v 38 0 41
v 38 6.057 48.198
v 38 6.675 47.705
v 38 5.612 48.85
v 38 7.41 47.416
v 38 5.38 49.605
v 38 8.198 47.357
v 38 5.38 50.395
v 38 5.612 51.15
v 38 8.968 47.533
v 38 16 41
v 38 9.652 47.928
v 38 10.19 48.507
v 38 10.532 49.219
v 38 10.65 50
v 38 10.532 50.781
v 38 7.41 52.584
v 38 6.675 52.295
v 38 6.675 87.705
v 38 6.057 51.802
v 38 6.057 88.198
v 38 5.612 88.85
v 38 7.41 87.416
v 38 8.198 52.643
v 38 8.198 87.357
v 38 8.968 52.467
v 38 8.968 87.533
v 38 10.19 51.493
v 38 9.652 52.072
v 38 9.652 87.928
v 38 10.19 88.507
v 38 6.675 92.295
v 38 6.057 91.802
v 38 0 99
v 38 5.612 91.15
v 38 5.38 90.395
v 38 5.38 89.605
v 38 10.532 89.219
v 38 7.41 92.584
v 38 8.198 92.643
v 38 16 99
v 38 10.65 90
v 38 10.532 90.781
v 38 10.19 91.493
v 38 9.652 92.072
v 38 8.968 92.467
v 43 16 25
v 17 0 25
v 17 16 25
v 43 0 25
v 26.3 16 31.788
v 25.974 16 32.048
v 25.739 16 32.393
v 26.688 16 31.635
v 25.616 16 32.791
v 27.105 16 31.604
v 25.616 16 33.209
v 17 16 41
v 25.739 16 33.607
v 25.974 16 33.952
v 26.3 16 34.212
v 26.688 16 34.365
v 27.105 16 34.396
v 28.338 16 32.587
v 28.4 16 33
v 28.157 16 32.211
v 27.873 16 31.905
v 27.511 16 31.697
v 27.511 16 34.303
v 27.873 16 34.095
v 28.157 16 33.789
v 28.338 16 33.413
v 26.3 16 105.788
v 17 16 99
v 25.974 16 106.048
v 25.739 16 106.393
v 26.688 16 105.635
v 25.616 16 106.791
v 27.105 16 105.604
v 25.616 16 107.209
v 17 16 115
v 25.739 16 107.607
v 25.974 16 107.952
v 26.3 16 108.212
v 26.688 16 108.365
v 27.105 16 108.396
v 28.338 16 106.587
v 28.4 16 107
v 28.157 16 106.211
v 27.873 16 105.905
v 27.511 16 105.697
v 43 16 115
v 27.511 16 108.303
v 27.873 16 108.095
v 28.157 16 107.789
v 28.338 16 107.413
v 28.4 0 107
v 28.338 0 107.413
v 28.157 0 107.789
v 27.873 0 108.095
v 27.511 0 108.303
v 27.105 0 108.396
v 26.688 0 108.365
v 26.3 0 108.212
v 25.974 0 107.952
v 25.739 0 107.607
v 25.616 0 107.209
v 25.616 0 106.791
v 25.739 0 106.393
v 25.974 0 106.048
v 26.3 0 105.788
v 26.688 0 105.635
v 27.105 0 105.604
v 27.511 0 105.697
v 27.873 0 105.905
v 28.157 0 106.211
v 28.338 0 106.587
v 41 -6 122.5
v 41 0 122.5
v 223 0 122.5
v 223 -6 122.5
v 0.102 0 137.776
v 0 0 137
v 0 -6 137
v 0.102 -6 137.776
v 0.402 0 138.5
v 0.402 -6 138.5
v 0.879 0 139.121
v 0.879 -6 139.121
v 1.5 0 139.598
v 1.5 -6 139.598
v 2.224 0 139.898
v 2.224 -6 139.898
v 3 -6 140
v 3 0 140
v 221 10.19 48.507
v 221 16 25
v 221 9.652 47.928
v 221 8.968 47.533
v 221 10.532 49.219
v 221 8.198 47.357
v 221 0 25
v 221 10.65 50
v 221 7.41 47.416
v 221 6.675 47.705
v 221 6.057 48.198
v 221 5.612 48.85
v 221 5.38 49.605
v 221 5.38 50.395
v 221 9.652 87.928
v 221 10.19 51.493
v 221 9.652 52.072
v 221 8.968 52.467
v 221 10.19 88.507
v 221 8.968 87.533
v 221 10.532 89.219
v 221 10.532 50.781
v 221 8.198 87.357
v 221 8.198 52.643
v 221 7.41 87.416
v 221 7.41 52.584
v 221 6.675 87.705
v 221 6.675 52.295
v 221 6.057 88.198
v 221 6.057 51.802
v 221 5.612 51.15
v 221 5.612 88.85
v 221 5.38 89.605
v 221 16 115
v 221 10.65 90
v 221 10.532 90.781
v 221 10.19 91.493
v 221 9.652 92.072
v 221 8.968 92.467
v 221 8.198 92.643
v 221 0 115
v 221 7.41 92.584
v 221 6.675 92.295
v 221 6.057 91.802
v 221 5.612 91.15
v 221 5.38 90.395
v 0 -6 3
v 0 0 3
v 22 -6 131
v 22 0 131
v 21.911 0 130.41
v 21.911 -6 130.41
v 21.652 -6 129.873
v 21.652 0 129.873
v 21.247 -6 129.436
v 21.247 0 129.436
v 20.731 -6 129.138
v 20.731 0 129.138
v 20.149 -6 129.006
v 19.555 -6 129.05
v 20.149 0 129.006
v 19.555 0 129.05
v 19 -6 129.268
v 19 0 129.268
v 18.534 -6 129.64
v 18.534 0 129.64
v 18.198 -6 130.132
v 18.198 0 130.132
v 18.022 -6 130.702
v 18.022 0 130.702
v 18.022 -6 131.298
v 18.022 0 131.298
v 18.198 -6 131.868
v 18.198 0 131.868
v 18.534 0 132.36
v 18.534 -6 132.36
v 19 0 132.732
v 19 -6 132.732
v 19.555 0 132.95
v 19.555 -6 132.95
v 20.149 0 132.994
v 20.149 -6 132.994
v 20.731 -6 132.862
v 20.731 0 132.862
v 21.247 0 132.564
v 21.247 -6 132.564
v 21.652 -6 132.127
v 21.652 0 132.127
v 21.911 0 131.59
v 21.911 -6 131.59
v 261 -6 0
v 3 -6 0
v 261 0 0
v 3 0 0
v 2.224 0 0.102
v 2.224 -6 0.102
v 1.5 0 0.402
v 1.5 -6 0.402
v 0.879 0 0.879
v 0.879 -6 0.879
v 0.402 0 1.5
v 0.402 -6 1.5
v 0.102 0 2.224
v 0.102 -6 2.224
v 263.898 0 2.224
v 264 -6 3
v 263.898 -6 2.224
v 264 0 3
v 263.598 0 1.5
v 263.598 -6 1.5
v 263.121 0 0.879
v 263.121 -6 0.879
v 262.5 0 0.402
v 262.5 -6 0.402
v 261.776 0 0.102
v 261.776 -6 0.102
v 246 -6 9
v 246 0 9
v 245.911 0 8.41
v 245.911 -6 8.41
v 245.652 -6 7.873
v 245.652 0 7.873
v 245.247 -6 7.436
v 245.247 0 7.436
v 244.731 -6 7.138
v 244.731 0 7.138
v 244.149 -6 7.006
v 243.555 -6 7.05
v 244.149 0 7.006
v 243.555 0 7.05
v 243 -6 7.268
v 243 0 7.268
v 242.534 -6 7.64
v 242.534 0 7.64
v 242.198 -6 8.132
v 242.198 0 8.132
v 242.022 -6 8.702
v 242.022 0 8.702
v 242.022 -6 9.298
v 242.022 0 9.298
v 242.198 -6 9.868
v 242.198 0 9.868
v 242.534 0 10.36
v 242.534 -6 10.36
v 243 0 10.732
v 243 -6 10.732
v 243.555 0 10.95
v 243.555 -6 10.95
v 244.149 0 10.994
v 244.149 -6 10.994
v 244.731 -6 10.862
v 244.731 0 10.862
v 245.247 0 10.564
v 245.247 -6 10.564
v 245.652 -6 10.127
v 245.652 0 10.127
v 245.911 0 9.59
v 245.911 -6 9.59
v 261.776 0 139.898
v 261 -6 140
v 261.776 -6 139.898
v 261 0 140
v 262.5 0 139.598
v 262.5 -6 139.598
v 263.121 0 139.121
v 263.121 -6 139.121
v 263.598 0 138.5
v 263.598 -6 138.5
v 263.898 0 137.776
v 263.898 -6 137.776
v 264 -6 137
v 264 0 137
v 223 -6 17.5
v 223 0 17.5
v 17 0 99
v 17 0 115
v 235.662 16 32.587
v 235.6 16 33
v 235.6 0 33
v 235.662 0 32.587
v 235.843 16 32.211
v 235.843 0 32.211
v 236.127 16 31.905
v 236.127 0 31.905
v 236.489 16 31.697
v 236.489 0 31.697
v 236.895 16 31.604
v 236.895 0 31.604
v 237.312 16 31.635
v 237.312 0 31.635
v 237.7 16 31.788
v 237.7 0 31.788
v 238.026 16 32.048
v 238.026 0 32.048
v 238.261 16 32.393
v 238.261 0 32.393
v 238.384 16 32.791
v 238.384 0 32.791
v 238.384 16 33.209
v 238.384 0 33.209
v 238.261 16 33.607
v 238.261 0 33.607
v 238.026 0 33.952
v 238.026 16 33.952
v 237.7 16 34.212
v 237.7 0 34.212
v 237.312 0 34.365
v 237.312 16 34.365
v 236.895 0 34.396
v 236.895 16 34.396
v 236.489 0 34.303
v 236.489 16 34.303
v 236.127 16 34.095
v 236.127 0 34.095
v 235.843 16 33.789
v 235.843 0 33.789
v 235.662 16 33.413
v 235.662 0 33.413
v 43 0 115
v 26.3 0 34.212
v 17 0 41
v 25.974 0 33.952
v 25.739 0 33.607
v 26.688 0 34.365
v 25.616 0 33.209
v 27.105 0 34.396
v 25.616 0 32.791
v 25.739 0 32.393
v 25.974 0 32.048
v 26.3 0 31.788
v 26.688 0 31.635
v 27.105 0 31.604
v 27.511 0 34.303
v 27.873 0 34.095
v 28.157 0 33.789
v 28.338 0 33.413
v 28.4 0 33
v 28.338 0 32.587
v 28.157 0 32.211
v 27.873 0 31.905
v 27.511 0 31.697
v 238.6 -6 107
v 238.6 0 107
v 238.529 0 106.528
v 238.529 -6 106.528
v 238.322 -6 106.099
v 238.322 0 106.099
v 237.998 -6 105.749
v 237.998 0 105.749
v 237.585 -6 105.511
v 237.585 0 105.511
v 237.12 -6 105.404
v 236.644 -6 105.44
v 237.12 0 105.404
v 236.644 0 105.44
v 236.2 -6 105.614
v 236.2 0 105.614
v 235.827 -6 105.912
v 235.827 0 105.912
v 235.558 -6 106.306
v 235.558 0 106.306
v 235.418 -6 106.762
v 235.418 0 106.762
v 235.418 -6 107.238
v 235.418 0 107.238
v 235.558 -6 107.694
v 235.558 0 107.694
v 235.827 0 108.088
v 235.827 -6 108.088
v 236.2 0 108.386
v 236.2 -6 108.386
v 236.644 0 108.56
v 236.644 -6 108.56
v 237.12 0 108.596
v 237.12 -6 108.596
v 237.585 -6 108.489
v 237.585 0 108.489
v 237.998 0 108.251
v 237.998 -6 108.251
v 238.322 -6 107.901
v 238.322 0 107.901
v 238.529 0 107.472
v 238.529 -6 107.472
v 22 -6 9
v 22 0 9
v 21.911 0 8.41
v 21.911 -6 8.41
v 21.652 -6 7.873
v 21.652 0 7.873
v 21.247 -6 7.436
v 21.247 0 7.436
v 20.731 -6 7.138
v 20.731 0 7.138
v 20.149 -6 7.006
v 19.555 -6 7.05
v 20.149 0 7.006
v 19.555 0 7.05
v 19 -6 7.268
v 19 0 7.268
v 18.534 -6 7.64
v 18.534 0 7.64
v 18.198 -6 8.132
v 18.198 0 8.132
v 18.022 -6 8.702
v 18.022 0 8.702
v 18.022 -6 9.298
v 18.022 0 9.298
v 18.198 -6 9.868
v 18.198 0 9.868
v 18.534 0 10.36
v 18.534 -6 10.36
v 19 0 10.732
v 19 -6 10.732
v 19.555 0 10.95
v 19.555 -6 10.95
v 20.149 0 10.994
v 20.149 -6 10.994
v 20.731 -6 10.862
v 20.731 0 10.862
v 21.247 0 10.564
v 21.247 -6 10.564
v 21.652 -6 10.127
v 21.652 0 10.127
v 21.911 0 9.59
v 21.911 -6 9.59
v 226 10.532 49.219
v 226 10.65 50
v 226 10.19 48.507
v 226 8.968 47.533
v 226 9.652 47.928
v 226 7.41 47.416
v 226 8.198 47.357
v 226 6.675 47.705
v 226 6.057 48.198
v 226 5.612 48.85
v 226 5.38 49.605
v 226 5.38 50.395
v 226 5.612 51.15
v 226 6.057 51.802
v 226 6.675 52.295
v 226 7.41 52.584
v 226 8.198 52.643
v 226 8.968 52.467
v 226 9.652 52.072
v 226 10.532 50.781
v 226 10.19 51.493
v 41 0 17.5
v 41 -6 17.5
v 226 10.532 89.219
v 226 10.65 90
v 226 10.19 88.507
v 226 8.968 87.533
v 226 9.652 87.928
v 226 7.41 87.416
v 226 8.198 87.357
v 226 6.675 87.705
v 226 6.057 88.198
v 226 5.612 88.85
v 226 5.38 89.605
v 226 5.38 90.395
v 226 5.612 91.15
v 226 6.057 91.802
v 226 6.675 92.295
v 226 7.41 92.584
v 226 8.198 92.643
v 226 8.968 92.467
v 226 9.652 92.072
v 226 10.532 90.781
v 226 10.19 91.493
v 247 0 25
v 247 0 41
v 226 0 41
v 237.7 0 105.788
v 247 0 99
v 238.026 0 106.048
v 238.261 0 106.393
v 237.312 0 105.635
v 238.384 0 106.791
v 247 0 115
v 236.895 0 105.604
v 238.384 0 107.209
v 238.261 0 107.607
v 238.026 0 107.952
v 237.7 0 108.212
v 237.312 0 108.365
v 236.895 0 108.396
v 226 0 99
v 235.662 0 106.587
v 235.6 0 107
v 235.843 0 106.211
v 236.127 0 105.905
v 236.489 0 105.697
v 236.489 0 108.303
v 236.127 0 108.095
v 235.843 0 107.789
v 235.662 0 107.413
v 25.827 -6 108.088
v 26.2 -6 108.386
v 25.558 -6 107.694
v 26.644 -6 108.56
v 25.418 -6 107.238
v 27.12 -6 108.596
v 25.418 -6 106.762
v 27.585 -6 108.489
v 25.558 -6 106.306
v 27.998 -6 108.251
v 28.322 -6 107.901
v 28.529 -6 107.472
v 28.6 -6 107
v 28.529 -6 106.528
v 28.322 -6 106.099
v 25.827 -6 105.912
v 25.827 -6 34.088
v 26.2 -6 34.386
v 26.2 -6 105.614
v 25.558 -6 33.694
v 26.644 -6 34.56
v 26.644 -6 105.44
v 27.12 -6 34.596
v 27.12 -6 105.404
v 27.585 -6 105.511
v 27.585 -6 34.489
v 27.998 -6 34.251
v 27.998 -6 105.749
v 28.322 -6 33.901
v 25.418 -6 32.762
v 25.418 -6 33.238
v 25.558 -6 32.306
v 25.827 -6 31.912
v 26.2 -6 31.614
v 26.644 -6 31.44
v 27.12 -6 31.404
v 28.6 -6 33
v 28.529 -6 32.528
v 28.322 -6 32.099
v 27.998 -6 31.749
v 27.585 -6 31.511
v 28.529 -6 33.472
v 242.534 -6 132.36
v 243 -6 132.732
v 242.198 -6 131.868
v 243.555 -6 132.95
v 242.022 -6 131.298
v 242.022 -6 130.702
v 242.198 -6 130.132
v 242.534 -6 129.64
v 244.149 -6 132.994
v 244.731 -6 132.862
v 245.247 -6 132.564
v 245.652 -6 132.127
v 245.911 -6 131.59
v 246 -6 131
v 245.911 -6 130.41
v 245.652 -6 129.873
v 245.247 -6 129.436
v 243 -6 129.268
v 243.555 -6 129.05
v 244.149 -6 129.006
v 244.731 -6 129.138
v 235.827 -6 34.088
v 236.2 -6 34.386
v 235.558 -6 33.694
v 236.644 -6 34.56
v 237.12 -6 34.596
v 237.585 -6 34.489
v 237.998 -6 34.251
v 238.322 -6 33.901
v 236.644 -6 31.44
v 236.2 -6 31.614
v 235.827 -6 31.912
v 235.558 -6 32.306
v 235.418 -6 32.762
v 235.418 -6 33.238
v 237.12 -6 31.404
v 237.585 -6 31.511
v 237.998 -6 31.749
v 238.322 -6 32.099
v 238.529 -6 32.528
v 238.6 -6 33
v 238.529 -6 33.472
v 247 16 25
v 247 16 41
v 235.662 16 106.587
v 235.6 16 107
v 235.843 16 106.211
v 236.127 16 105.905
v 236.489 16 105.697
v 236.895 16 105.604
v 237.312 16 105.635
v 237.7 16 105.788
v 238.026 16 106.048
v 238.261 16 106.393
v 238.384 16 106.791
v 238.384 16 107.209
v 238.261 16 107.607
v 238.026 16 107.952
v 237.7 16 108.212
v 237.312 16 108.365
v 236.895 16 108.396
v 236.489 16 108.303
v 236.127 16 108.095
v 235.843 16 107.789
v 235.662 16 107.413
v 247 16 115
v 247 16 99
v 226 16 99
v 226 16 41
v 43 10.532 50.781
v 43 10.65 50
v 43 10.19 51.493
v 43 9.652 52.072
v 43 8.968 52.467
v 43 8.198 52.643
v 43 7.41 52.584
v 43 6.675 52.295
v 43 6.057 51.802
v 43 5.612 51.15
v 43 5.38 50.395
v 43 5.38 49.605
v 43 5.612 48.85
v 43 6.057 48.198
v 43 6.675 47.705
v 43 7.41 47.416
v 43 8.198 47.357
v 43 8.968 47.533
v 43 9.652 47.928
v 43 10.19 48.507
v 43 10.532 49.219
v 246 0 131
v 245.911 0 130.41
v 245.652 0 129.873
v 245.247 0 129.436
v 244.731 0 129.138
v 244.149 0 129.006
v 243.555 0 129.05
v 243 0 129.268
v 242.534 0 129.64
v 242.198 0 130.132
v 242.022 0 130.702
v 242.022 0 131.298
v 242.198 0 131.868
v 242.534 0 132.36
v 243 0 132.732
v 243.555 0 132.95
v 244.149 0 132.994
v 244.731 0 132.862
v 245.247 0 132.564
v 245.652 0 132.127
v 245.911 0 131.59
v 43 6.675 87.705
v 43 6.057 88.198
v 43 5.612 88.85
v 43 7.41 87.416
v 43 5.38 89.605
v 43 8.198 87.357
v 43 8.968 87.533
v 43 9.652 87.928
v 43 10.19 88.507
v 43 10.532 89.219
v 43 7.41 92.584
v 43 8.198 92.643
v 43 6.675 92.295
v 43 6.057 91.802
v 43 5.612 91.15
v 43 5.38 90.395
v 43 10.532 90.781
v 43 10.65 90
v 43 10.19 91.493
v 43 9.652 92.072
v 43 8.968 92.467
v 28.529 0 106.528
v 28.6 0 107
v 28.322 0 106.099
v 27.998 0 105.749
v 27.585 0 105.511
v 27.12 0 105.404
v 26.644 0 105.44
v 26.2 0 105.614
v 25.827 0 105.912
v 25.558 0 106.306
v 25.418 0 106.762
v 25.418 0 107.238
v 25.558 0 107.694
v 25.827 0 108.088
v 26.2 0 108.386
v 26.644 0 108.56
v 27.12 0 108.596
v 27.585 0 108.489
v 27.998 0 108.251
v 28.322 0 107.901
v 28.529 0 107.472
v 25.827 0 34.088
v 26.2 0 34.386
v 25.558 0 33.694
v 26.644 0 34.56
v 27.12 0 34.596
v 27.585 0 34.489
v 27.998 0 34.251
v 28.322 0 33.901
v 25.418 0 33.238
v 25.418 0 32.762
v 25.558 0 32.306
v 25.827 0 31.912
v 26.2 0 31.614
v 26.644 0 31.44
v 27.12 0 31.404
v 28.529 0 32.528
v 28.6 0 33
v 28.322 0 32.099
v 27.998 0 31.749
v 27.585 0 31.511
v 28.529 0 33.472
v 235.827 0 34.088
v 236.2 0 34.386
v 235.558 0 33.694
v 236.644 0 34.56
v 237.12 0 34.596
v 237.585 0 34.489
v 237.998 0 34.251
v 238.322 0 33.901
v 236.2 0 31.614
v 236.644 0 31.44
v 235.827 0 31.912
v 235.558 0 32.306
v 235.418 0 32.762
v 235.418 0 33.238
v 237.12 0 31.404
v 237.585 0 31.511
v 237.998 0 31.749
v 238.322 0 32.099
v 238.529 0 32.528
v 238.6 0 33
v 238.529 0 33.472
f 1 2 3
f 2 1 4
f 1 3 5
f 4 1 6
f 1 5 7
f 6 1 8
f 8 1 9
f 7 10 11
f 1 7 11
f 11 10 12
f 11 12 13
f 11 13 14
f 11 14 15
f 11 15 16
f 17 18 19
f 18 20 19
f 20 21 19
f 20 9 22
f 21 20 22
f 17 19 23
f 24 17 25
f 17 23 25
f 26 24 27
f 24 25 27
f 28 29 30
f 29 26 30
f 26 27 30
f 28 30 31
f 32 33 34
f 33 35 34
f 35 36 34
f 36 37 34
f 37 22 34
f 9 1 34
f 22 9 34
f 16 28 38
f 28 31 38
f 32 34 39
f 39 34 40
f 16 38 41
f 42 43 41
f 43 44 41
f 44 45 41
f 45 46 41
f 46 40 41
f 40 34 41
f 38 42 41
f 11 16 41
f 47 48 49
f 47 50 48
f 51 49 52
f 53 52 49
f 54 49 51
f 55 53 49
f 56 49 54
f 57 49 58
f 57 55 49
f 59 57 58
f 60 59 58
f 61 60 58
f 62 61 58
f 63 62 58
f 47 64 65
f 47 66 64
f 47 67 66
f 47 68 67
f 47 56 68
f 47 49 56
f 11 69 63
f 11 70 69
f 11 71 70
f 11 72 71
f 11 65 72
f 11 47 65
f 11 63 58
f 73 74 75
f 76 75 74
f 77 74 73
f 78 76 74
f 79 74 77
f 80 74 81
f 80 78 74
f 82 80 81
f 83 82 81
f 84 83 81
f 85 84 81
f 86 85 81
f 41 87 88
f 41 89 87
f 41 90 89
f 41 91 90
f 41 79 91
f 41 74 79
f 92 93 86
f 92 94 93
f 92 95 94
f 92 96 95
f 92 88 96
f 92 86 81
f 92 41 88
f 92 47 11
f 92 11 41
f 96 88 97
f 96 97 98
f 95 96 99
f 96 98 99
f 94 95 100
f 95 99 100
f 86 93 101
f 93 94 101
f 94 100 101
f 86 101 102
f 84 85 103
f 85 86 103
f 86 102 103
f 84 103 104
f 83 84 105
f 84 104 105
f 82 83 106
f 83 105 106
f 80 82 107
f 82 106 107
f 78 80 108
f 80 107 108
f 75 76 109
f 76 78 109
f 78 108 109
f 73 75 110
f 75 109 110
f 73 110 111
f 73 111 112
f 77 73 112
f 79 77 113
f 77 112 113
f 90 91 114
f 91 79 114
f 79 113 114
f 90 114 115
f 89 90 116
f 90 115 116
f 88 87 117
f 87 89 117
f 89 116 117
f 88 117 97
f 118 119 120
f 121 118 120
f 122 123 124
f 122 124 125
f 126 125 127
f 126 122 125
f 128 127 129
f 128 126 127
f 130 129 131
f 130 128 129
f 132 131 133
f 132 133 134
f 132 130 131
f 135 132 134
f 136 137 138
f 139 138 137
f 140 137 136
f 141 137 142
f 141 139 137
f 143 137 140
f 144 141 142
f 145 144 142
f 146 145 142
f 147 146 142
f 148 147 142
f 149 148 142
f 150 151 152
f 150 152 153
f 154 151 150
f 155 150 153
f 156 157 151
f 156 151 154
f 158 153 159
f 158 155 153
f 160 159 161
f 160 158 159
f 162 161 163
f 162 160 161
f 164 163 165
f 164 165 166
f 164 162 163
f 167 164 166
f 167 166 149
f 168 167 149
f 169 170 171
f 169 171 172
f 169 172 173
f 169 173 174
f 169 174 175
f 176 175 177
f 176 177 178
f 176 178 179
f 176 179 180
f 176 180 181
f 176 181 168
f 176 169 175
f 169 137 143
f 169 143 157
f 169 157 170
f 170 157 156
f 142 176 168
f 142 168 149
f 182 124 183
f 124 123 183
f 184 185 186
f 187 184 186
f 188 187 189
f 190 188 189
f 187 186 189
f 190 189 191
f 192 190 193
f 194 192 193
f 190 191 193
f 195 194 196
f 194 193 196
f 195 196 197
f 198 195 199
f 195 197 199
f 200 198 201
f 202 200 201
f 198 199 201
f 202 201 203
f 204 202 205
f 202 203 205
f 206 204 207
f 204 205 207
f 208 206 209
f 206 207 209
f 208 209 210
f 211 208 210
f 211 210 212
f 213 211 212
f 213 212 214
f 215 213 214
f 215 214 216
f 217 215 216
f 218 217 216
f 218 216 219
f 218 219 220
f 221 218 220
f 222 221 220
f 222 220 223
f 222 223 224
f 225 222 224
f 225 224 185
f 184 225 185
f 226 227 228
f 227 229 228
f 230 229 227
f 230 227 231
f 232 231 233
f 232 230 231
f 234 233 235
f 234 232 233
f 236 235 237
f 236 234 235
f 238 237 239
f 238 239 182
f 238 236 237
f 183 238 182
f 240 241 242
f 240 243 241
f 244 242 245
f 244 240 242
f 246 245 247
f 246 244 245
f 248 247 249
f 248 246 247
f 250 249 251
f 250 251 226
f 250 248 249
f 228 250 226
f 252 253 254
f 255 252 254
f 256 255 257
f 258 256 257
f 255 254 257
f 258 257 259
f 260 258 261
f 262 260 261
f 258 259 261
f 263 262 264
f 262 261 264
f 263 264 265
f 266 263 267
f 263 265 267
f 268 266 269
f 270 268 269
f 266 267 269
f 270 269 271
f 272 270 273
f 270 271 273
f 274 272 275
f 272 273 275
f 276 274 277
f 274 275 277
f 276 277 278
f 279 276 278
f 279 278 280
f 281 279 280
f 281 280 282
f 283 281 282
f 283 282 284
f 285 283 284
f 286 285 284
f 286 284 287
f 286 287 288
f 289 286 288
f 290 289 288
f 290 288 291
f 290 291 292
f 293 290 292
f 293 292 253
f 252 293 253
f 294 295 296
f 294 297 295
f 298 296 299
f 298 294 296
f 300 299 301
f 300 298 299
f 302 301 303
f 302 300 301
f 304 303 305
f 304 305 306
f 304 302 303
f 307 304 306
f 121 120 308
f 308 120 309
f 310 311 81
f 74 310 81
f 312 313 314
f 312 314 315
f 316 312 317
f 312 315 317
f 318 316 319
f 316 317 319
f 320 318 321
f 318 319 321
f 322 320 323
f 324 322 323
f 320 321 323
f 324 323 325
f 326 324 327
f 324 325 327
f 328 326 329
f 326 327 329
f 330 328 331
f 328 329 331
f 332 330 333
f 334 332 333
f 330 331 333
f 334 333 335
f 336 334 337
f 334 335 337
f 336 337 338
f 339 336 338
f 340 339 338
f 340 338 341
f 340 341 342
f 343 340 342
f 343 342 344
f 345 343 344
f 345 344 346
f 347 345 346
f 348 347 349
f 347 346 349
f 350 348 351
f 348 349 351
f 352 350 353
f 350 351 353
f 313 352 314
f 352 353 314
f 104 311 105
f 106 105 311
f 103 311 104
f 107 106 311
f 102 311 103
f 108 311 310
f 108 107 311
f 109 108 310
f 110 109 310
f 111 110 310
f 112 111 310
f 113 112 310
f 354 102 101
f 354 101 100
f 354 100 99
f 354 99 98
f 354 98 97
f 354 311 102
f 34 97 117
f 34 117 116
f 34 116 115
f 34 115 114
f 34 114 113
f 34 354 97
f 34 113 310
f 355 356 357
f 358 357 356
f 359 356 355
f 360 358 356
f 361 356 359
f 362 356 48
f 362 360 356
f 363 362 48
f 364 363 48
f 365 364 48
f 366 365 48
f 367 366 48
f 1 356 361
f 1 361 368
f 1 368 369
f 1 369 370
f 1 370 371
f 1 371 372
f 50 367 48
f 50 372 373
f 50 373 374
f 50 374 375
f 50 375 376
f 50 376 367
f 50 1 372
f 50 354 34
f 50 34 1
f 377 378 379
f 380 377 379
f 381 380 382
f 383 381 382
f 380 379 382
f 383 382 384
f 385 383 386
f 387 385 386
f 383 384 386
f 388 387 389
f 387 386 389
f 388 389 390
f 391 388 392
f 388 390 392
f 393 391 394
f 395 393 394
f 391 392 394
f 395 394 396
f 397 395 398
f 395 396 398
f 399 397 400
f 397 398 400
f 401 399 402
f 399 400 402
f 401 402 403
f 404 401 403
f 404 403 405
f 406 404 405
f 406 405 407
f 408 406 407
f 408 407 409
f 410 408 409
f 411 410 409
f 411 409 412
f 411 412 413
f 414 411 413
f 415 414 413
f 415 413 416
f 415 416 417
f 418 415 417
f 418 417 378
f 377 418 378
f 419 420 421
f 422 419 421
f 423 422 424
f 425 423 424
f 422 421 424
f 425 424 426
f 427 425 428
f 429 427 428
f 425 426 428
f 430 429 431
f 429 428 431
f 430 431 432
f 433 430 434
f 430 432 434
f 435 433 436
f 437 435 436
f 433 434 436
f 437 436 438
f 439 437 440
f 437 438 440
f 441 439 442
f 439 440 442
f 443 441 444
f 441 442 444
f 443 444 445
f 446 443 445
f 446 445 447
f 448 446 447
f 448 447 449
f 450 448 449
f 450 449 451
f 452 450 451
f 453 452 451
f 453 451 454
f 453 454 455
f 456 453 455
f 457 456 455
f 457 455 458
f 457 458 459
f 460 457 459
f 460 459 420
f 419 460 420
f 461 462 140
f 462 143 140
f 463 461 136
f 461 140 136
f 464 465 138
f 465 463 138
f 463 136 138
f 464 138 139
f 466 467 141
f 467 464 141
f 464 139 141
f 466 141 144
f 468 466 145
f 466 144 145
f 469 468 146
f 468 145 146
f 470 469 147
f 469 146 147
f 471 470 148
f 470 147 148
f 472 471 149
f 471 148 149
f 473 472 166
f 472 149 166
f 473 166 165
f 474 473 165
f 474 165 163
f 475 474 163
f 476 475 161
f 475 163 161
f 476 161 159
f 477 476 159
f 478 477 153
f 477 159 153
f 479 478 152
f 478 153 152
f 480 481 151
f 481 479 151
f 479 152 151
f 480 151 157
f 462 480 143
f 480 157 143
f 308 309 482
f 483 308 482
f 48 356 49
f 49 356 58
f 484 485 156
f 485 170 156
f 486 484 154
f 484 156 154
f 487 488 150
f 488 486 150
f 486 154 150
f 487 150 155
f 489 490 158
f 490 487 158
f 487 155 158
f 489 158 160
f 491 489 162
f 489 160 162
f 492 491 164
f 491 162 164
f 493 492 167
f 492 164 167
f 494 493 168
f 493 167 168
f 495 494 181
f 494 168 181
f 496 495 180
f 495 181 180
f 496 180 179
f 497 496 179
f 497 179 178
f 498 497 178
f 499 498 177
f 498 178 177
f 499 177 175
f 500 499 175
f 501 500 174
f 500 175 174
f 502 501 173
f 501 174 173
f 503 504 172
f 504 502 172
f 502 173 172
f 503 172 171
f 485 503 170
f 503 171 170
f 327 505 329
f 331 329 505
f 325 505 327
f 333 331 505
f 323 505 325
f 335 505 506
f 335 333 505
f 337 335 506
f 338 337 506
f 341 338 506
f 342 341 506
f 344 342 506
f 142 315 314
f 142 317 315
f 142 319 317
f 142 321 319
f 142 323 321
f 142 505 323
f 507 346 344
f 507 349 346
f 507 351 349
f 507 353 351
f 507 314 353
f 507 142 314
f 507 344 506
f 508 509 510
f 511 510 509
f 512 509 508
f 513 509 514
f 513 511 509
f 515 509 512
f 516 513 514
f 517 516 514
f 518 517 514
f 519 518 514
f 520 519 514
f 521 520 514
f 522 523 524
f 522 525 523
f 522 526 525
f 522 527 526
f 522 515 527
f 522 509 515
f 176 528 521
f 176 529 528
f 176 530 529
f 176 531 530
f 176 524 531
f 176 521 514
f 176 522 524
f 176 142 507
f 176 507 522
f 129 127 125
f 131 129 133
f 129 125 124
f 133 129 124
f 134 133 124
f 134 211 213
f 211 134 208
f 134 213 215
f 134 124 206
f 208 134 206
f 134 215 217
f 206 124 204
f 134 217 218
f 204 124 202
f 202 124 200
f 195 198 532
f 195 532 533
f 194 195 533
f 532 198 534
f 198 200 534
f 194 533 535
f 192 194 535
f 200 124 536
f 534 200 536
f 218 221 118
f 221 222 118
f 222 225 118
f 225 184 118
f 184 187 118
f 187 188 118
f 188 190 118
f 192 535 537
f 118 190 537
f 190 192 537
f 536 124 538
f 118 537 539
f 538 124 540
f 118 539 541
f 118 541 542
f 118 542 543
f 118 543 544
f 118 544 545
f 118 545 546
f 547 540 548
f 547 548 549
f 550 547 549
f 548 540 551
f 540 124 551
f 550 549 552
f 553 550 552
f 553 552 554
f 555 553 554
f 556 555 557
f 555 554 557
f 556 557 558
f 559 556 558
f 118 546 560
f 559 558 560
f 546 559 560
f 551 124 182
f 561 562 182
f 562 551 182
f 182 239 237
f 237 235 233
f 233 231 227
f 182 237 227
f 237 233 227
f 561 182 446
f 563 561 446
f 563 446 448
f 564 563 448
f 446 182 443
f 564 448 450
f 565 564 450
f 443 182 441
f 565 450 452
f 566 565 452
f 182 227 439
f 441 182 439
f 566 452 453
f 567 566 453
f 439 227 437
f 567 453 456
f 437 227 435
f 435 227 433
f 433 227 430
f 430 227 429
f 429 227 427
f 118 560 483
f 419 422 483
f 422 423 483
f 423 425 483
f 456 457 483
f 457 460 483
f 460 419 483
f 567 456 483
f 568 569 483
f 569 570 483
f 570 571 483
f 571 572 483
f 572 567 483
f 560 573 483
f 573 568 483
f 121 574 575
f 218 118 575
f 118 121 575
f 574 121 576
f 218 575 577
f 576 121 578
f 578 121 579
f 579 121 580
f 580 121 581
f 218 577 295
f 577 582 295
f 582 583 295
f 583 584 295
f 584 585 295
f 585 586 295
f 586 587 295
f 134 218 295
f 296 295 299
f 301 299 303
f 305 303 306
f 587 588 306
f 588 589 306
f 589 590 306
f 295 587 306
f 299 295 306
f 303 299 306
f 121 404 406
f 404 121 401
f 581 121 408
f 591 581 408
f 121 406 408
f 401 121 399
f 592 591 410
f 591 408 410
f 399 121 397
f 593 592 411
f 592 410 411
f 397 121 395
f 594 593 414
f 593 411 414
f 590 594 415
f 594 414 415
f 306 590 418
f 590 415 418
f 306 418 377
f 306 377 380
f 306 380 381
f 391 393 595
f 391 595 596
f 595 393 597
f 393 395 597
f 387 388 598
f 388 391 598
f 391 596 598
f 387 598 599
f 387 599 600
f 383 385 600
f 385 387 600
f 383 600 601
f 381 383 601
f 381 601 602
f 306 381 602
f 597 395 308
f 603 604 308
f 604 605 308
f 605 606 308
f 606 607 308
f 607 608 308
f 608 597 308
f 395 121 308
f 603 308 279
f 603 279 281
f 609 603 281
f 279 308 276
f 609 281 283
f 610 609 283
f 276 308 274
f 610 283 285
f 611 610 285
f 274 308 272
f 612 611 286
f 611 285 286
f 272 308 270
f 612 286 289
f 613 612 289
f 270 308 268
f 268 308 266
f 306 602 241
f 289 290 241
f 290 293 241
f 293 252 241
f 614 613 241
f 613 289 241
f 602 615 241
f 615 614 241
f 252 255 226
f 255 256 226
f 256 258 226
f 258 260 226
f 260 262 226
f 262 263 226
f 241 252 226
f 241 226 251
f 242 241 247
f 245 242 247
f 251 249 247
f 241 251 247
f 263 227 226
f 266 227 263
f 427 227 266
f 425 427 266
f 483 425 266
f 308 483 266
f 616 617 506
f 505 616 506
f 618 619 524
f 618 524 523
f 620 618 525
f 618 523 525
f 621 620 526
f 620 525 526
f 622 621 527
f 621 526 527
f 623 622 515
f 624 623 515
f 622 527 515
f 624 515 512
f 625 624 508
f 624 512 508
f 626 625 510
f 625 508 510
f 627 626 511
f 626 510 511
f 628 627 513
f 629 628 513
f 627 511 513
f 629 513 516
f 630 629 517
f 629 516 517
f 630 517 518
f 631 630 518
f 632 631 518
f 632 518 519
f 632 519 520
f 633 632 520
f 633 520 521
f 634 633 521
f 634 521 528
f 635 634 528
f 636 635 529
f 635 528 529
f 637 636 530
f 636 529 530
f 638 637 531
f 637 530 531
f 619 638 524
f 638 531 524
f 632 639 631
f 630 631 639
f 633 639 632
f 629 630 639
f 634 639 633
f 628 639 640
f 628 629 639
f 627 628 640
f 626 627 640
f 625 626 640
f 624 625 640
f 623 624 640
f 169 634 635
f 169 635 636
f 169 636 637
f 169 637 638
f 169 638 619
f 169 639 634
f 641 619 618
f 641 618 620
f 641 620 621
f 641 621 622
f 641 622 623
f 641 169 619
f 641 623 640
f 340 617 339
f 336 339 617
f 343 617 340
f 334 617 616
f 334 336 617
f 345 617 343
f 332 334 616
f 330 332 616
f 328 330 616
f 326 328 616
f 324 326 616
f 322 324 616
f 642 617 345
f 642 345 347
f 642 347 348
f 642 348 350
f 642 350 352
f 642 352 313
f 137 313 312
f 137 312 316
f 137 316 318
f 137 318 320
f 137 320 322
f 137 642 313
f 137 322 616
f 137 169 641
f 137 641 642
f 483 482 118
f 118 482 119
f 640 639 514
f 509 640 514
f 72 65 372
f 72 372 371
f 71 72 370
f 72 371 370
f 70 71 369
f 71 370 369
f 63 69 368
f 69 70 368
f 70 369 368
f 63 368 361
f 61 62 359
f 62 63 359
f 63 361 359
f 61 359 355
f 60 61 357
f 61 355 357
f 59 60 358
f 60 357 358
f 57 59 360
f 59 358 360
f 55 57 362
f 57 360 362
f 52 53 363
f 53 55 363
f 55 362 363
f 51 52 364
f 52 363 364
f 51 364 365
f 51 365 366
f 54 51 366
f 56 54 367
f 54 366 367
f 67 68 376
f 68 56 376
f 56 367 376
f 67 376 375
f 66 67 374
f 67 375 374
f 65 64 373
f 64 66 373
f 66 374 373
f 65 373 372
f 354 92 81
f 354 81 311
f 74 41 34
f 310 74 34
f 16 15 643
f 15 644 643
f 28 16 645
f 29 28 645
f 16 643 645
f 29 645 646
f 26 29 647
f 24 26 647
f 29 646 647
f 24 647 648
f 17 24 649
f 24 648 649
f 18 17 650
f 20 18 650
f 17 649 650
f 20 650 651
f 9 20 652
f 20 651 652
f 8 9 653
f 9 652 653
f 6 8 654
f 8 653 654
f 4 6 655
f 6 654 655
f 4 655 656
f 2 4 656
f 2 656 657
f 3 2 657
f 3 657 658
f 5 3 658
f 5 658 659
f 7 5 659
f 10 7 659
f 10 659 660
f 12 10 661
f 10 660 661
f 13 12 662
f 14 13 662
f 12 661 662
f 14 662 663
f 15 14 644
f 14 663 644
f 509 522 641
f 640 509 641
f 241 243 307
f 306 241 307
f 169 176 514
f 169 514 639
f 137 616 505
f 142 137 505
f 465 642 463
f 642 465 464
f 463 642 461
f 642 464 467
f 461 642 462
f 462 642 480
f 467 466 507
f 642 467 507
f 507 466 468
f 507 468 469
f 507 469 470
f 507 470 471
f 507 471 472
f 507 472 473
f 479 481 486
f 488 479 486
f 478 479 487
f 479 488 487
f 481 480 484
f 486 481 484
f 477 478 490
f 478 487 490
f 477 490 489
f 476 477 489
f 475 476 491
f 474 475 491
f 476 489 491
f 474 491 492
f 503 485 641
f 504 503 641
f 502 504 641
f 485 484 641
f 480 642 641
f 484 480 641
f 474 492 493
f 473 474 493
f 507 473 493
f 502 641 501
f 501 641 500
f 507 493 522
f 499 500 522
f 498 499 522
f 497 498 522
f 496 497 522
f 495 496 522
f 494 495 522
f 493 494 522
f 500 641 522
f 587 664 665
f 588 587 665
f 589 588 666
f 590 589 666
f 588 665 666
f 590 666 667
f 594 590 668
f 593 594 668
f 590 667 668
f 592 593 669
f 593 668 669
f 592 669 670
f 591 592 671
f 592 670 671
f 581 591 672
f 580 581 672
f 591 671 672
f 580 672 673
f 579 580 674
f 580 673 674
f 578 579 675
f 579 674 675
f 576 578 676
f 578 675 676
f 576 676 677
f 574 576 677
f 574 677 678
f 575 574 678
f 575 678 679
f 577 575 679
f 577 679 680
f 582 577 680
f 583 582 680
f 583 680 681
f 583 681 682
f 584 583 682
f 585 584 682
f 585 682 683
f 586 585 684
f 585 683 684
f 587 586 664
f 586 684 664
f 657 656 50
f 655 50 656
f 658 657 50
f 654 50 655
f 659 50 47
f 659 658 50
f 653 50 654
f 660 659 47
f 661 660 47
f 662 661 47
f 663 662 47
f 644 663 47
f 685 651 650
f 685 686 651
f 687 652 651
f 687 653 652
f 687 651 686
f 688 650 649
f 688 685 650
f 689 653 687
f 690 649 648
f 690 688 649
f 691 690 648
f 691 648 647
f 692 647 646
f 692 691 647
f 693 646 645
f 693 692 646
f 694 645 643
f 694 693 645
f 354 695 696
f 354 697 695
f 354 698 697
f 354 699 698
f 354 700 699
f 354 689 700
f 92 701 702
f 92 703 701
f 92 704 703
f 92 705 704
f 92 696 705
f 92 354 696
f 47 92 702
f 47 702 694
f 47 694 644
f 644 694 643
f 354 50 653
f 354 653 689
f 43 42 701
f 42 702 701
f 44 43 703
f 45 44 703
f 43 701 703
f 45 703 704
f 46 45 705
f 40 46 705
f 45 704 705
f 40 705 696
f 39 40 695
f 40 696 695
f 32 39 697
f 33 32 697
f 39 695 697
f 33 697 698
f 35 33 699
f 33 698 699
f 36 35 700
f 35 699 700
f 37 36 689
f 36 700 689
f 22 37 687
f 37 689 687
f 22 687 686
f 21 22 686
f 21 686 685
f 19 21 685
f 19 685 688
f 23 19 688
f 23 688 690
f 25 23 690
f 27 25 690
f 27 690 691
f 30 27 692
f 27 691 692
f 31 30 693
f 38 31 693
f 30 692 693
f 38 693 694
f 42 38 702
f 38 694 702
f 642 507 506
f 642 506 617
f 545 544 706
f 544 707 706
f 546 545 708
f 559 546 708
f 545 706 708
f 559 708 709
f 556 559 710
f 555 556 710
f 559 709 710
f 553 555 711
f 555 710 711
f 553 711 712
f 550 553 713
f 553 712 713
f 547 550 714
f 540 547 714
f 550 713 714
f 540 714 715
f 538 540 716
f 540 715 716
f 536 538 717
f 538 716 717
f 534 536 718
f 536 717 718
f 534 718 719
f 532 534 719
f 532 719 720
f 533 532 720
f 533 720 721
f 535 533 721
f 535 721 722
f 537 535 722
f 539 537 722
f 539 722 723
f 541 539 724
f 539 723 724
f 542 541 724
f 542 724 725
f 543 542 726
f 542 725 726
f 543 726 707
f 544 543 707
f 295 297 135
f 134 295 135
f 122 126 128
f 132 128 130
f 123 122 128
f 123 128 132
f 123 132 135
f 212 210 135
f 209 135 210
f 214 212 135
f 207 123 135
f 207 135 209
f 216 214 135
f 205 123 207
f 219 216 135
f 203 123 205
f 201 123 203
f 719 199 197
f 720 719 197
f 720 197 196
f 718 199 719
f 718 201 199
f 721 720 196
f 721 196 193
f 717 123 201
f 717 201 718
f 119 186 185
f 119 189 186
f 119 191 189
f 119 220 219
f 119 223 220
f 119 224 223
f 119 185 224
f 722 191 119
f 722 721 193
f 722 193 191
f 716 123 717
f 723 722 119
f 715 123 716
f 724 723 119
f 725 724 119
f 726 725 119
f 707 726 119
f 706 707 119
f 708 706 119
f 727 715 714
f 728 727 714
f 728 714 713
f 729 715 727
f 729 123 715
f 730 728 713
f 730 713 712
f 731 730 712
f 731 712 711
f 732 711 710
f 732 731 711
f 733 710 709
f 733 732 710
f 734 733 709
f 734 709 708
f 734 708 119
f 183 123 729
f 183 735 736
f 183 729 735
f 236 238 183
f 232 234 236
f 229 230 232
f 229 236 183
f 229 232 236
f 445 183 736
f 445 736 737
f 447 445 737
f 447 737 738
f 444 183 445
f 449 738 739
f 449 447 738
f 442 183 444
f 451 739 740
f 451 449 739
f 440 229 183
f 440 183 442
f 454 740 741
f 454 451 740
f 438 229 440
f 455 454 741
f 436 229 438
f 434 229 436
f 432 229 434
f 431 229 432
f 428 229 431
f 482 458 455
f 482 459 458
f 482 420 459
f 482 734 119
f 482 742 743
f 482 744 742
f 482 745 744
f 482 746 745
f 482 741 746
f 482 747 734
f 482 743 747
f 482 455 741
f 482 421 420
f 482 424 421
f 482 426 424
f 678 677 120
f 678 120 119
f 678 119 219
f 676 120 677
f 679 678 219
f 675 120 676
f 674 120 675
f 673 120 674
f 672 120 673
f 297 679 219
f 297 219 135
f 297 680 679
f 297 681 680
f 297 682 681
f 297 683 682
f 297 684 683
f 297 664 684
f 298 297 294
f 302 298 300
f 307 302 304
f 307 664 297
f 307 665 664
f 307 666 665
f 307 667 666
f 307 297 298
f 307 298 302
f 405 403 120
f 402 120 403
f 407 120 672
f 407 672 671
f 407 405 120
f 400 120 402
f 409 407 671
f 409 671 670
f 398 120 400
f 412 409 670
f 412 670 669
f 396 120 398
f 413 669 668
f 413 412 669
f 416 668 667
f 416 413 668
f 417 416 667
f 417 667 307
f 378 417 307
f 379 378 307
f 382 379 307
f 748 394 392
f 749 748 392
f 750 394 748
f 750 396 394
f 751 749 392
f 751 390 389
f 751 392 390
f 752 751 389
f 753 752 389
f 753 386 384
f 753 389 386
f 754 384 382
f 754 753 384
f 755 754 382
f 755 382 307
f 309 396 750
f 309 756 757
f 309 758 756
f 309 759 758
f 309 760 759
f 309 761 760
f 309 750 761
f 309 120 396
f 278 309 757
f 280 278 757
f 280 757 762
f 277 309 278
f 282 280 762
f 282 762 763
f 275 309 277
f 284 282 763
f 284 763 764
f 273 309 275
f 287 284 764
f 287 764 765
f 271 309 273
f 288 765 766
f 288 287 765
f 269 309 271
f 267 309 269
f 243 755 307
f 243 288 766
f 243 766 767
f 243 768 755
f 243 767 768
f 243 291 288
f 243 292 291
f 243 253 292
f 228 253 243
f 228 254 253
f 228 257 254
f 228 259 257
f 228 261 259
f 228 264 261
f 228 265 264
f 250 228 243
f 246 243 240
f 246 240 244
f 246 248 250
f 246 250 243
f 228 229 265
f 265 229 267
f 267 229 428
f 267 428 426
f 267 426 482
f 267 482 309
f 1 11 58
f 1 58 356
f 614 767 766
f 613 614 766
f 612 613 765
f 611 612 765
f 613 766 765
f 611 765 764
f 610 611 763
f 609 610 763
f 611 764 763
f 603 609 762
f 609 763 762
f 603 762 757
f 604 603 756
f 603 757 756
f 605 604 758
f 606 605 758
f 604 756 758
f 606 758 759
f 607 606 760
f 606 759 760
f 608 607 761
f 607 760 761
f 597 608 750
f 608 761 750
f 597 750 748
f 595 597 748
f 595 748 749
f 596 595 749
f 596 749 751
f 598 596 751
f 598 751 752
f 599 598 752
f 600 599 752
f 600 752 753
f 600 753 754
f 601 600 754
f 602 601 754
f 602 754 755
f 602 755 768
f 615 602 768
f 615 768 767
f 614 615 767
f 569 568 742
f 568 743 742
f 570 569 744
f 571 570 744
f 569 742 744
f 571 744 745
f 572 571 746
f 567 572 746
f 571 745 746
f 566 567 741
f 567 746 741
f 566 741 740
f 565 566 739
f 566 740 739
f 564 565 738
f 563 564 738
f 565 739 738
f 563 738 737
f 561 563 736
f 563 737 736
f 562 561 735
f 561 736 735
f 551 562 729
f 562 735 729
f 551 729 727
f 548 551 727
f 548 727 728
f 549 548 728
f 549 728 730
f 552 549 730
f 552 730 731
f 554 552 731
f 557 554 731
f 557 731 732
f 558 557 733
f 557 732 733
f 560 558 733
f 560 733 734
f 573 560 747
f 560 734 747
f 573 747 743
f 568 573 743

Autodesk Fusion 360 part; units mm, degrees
ref_plane "WorkPlane1" through (43, 0, 0) normal (1, 0, 0) x (0, 1, 0)
ref_plane "WorkPlane2" through (132, 0, 0) normal (1, 0, 0) x (0, 1, 0)
sketch "dimensions" plane through (0, 0, 0) normal (0, 1, 0) x (1, 0, 0)
  line L0 (0, 0) -> (264, 0)
  line L1 (264, 0) -> (264, -140)
  line L2 (264, -140) -> (0, -140)
  line L3 (0, -140) -> (0, 0)
  line L4 (132, -140) -> (132, 0) construction
  line L5 (264, -70) -> (0, -70) construction
  line L6 (257.4125, -120.8) -> (6.5875, -120.8) construction
  line L7 (6.5875, -120.8) -> (6.5875, -19.2) construction
  line L8 (6.5875, -19.2) -> (257.4125, -19.2) construction
  line L9 (257.4125, -19.2) -> (257.4125, -120.8) construction
  line L10 (257.4125, -120.8) -> (6.5875, -19.2) construction
  line L11 (6.5875, -120.8) -> (257.4125, -19.2) construction
  line L12 (41, -122.5) -> (223, -122.5)
  line L13 (223, -122.5) -> (223, -17.5)
  line L14 (223, -17.5) -> (41, -17.5)
  line L15 (41, -17.5) -> (41, -122.5)
  line L16 (41, -122.5) -> (223, -17.5) construction
  line L17 (223, -122.5) -> (41, -17.5) construction
  line L18 (43, -140) -> (43, 0) construction
  line L19 (221, -140) -> (221, 0) construction
  line L20 (43, -33) -> (27, -33) construction
  line L21 (43, -107) -> (27, -107) construction
  line L22 (221, -107) -> (237, -107) construction
  line L23 (221, -33) -> (237, -33) construction
  circle A0 centre (27, -107) radius 1.4
  circle A1 centre (27, -33) radius 1.4
  circle A2 centre (237, -107) radius 1.4
  circle A3 centre (237, -33) radius 1.4
  point P0 (132, -70)
  point P1 (132, -70)
  point P2 (132, -70)
  point P3 (43, -70)
  point P4 (221, -70)
  dimension "d1" = 264
  dimension "d2" = 140
  dimension "d3" = 250.825
  dimension "d4" = 101.6
  dimension "d5" = 182
  dimension "d6" = 105
  dimension "d7" = 43
  dimension "d8" = 43
  dimension "d23" = 16
  dimension "d24" = 16
  dimension "d25" = 37
  dimension "d26" = 37
  dimension "d27" = 16
  dimension "d28" = 16
  dimension "d29" = 37
  dimension "d30" = 37
  dimension "d31" = 2.8
  dimension "d32" = 2.8
  dimension "d33" = 2.8
  dimension "d34" = 2.8
  dimension "d58" = 132
sketch "left-bracket" plane through (43, 0, 0) normal (1, 0, 0) x (0, 1, 0)
  line L0 (0, 70) -> (8, 70) construction
  line L1 (8, 70) -> (8, 90) construction
  line L2 (8, 70) -> (8, 50) construction
  circle A0 centre (8, 90) radius 2.65
  circle A1 centre (8, 50) radius 2.65
  line L3 (5.6906, 94) -> (3.3812, 90) construction
  line L4 (3.3812, 90) -> (5.6906, 86) construction
  line L5 (5.6906, 86) -> (10.3094, 86) construction
  line L6 (10.3094, 86) -> (12.6188, 90) construction
  line L7 (12.6188, 90) -> (10.3094, 94) construction
  line L8 (10.3094, 94) -> (5.6906, 94) construction
  line L9 (5.6906, 54) -> (3.3812, 50) construction
  line L10 (3.3812, 50) -> (5.6906, 46) construction
  line L11 (5.6906, 46) -> (10.3094, 46) construction
  line L12 (10.3094, 46) -> (12.6188, 50) construction
  line L13 (12.6188, 50) -> (10.3094, 54) construction
  line L14 (10.3094, 54) -> (5.6906, 54) construction
  line L15 (0, 70) -> (0, 25) construction
  line L16 (0, 25) -> (16, 25)
  line L17 (16, 25) -> (16, 115)
  line L18 (16, 115) -> (0, 115)
  line L19 (0, 115) -> (0, 25)
  line L20 (16, 99) -> (0, 99)
  line L21 (16, 41) -> (0, 41)
  point P0 (0, 70)
  point P1 (8, 90)
  point P2 (8, 50)
  dimension "d11" = 8
  dimension "d12" = 20
  dimension "d13" = 20
  dimension "d14" = 5.3
  dimension "d15" = 5.3
  dimension "d16" = 4
  dimension "d17" = 4
  dimension "d18" = 45
  dimension "d19" = 16
  dimension "d20" = 90
  dimension "d21" = 16
  dimension "d22" = 16
sketch "esgoo_wood" plane through (0, 0, 0) normal (0, 1, 0) x (1, 0, 0)
  line L0 (3, 0) -> (261, 0)
  line L1 (264, -3) -> (264, -137)
  line L2 (0, -137) -> (0, -3)
  line L3 (261, -140) -> (3, -140)
  line L4 (41, -17.5) -> (41, -122.5)
  line L5 (41, -122.5) -> (223, -122.5)
  line L6 (223, -17.5) -> (41, -17.5)
  line L7 (223, -122.5) -> (223, -17.5)
  circle A0 centre (27, -107) radius 1.6
  circle A1 centre (27, -33) radius 1.6
  circle A2 centre (237, -107) radius 1.6
  circle A3 centre (237, -33) radius 1.6
  circle A4 centre (20, -131) radius 2
  circle A5 centre (244, -131) radius 2
  circle A6 centre (244, -9) radius 2
  circle A7 centre (20, -9) radius 2
  arc A8 (0, -137) -> (3, -140) centre (3, -137) ccw
  arc A9 (261, -140) -> (264, -137) centre (261, -137) ccw
  arc A10 (264, -3) -> (261, 0) centre (261, -3) ccw
  arc A11 (3, 0) -> (0, -3) centre (3, -3) ccw
  point P0 (27, -107)
  point P1 (27, -33)
  point P2 (237, -33)
  point P3 (237, -107)
  point P4 (0, -140)
  dimension "d35" = 3.2
  dimension "d36" = 3.2
  dimension "d37" = 3.2
  dimension "d38" = 3.2
  dimension "d39" = 4
  dimension "d40" = 20
  dimension "d41" = 9
  dimension "d42" = 4
  dimension "d43" = 4
  dimension "d44" = 4
  dimension "d45" = 20
  dimension "d46" = 9
  dimension "d47" = 20
  dimension "d48" = 9
  dimension "d49" = 20
  dimension "d50" = 9
  dimension "d51" = 3
extrude "Extrude1" add sketch "left-bracket" against normal blind 5 contours L17 L19 L20 L21 makes body 1
extrude "Extrude2" add sketch "left-bracket" against normal blind 26 contours L16 L17 L19 L21 | L17 L18 L19 L20 bodies 1
extrude "Extrude3" cut sketch "dimensions" along normal blind 16 contours A0 | A1 bodies 1
mirror "Mirror1" about plane through (132, 0, 0) normal (1, 0, 0) of bodies 1 makes body 2
extrude "Extrude4" add sketch "esgoo_wood" against normal blind 6 separate body makes body 3
equation "d3 = 9 7/8\""
equation "d4 = 4\""
equation "d25 = 45 mm - 8 mm"
equation "d26 = 45 mm - 8 mm"
equation "d29 = 45 mm - 8 mm"
equation "d30 = 45 mm - 8 mm"
